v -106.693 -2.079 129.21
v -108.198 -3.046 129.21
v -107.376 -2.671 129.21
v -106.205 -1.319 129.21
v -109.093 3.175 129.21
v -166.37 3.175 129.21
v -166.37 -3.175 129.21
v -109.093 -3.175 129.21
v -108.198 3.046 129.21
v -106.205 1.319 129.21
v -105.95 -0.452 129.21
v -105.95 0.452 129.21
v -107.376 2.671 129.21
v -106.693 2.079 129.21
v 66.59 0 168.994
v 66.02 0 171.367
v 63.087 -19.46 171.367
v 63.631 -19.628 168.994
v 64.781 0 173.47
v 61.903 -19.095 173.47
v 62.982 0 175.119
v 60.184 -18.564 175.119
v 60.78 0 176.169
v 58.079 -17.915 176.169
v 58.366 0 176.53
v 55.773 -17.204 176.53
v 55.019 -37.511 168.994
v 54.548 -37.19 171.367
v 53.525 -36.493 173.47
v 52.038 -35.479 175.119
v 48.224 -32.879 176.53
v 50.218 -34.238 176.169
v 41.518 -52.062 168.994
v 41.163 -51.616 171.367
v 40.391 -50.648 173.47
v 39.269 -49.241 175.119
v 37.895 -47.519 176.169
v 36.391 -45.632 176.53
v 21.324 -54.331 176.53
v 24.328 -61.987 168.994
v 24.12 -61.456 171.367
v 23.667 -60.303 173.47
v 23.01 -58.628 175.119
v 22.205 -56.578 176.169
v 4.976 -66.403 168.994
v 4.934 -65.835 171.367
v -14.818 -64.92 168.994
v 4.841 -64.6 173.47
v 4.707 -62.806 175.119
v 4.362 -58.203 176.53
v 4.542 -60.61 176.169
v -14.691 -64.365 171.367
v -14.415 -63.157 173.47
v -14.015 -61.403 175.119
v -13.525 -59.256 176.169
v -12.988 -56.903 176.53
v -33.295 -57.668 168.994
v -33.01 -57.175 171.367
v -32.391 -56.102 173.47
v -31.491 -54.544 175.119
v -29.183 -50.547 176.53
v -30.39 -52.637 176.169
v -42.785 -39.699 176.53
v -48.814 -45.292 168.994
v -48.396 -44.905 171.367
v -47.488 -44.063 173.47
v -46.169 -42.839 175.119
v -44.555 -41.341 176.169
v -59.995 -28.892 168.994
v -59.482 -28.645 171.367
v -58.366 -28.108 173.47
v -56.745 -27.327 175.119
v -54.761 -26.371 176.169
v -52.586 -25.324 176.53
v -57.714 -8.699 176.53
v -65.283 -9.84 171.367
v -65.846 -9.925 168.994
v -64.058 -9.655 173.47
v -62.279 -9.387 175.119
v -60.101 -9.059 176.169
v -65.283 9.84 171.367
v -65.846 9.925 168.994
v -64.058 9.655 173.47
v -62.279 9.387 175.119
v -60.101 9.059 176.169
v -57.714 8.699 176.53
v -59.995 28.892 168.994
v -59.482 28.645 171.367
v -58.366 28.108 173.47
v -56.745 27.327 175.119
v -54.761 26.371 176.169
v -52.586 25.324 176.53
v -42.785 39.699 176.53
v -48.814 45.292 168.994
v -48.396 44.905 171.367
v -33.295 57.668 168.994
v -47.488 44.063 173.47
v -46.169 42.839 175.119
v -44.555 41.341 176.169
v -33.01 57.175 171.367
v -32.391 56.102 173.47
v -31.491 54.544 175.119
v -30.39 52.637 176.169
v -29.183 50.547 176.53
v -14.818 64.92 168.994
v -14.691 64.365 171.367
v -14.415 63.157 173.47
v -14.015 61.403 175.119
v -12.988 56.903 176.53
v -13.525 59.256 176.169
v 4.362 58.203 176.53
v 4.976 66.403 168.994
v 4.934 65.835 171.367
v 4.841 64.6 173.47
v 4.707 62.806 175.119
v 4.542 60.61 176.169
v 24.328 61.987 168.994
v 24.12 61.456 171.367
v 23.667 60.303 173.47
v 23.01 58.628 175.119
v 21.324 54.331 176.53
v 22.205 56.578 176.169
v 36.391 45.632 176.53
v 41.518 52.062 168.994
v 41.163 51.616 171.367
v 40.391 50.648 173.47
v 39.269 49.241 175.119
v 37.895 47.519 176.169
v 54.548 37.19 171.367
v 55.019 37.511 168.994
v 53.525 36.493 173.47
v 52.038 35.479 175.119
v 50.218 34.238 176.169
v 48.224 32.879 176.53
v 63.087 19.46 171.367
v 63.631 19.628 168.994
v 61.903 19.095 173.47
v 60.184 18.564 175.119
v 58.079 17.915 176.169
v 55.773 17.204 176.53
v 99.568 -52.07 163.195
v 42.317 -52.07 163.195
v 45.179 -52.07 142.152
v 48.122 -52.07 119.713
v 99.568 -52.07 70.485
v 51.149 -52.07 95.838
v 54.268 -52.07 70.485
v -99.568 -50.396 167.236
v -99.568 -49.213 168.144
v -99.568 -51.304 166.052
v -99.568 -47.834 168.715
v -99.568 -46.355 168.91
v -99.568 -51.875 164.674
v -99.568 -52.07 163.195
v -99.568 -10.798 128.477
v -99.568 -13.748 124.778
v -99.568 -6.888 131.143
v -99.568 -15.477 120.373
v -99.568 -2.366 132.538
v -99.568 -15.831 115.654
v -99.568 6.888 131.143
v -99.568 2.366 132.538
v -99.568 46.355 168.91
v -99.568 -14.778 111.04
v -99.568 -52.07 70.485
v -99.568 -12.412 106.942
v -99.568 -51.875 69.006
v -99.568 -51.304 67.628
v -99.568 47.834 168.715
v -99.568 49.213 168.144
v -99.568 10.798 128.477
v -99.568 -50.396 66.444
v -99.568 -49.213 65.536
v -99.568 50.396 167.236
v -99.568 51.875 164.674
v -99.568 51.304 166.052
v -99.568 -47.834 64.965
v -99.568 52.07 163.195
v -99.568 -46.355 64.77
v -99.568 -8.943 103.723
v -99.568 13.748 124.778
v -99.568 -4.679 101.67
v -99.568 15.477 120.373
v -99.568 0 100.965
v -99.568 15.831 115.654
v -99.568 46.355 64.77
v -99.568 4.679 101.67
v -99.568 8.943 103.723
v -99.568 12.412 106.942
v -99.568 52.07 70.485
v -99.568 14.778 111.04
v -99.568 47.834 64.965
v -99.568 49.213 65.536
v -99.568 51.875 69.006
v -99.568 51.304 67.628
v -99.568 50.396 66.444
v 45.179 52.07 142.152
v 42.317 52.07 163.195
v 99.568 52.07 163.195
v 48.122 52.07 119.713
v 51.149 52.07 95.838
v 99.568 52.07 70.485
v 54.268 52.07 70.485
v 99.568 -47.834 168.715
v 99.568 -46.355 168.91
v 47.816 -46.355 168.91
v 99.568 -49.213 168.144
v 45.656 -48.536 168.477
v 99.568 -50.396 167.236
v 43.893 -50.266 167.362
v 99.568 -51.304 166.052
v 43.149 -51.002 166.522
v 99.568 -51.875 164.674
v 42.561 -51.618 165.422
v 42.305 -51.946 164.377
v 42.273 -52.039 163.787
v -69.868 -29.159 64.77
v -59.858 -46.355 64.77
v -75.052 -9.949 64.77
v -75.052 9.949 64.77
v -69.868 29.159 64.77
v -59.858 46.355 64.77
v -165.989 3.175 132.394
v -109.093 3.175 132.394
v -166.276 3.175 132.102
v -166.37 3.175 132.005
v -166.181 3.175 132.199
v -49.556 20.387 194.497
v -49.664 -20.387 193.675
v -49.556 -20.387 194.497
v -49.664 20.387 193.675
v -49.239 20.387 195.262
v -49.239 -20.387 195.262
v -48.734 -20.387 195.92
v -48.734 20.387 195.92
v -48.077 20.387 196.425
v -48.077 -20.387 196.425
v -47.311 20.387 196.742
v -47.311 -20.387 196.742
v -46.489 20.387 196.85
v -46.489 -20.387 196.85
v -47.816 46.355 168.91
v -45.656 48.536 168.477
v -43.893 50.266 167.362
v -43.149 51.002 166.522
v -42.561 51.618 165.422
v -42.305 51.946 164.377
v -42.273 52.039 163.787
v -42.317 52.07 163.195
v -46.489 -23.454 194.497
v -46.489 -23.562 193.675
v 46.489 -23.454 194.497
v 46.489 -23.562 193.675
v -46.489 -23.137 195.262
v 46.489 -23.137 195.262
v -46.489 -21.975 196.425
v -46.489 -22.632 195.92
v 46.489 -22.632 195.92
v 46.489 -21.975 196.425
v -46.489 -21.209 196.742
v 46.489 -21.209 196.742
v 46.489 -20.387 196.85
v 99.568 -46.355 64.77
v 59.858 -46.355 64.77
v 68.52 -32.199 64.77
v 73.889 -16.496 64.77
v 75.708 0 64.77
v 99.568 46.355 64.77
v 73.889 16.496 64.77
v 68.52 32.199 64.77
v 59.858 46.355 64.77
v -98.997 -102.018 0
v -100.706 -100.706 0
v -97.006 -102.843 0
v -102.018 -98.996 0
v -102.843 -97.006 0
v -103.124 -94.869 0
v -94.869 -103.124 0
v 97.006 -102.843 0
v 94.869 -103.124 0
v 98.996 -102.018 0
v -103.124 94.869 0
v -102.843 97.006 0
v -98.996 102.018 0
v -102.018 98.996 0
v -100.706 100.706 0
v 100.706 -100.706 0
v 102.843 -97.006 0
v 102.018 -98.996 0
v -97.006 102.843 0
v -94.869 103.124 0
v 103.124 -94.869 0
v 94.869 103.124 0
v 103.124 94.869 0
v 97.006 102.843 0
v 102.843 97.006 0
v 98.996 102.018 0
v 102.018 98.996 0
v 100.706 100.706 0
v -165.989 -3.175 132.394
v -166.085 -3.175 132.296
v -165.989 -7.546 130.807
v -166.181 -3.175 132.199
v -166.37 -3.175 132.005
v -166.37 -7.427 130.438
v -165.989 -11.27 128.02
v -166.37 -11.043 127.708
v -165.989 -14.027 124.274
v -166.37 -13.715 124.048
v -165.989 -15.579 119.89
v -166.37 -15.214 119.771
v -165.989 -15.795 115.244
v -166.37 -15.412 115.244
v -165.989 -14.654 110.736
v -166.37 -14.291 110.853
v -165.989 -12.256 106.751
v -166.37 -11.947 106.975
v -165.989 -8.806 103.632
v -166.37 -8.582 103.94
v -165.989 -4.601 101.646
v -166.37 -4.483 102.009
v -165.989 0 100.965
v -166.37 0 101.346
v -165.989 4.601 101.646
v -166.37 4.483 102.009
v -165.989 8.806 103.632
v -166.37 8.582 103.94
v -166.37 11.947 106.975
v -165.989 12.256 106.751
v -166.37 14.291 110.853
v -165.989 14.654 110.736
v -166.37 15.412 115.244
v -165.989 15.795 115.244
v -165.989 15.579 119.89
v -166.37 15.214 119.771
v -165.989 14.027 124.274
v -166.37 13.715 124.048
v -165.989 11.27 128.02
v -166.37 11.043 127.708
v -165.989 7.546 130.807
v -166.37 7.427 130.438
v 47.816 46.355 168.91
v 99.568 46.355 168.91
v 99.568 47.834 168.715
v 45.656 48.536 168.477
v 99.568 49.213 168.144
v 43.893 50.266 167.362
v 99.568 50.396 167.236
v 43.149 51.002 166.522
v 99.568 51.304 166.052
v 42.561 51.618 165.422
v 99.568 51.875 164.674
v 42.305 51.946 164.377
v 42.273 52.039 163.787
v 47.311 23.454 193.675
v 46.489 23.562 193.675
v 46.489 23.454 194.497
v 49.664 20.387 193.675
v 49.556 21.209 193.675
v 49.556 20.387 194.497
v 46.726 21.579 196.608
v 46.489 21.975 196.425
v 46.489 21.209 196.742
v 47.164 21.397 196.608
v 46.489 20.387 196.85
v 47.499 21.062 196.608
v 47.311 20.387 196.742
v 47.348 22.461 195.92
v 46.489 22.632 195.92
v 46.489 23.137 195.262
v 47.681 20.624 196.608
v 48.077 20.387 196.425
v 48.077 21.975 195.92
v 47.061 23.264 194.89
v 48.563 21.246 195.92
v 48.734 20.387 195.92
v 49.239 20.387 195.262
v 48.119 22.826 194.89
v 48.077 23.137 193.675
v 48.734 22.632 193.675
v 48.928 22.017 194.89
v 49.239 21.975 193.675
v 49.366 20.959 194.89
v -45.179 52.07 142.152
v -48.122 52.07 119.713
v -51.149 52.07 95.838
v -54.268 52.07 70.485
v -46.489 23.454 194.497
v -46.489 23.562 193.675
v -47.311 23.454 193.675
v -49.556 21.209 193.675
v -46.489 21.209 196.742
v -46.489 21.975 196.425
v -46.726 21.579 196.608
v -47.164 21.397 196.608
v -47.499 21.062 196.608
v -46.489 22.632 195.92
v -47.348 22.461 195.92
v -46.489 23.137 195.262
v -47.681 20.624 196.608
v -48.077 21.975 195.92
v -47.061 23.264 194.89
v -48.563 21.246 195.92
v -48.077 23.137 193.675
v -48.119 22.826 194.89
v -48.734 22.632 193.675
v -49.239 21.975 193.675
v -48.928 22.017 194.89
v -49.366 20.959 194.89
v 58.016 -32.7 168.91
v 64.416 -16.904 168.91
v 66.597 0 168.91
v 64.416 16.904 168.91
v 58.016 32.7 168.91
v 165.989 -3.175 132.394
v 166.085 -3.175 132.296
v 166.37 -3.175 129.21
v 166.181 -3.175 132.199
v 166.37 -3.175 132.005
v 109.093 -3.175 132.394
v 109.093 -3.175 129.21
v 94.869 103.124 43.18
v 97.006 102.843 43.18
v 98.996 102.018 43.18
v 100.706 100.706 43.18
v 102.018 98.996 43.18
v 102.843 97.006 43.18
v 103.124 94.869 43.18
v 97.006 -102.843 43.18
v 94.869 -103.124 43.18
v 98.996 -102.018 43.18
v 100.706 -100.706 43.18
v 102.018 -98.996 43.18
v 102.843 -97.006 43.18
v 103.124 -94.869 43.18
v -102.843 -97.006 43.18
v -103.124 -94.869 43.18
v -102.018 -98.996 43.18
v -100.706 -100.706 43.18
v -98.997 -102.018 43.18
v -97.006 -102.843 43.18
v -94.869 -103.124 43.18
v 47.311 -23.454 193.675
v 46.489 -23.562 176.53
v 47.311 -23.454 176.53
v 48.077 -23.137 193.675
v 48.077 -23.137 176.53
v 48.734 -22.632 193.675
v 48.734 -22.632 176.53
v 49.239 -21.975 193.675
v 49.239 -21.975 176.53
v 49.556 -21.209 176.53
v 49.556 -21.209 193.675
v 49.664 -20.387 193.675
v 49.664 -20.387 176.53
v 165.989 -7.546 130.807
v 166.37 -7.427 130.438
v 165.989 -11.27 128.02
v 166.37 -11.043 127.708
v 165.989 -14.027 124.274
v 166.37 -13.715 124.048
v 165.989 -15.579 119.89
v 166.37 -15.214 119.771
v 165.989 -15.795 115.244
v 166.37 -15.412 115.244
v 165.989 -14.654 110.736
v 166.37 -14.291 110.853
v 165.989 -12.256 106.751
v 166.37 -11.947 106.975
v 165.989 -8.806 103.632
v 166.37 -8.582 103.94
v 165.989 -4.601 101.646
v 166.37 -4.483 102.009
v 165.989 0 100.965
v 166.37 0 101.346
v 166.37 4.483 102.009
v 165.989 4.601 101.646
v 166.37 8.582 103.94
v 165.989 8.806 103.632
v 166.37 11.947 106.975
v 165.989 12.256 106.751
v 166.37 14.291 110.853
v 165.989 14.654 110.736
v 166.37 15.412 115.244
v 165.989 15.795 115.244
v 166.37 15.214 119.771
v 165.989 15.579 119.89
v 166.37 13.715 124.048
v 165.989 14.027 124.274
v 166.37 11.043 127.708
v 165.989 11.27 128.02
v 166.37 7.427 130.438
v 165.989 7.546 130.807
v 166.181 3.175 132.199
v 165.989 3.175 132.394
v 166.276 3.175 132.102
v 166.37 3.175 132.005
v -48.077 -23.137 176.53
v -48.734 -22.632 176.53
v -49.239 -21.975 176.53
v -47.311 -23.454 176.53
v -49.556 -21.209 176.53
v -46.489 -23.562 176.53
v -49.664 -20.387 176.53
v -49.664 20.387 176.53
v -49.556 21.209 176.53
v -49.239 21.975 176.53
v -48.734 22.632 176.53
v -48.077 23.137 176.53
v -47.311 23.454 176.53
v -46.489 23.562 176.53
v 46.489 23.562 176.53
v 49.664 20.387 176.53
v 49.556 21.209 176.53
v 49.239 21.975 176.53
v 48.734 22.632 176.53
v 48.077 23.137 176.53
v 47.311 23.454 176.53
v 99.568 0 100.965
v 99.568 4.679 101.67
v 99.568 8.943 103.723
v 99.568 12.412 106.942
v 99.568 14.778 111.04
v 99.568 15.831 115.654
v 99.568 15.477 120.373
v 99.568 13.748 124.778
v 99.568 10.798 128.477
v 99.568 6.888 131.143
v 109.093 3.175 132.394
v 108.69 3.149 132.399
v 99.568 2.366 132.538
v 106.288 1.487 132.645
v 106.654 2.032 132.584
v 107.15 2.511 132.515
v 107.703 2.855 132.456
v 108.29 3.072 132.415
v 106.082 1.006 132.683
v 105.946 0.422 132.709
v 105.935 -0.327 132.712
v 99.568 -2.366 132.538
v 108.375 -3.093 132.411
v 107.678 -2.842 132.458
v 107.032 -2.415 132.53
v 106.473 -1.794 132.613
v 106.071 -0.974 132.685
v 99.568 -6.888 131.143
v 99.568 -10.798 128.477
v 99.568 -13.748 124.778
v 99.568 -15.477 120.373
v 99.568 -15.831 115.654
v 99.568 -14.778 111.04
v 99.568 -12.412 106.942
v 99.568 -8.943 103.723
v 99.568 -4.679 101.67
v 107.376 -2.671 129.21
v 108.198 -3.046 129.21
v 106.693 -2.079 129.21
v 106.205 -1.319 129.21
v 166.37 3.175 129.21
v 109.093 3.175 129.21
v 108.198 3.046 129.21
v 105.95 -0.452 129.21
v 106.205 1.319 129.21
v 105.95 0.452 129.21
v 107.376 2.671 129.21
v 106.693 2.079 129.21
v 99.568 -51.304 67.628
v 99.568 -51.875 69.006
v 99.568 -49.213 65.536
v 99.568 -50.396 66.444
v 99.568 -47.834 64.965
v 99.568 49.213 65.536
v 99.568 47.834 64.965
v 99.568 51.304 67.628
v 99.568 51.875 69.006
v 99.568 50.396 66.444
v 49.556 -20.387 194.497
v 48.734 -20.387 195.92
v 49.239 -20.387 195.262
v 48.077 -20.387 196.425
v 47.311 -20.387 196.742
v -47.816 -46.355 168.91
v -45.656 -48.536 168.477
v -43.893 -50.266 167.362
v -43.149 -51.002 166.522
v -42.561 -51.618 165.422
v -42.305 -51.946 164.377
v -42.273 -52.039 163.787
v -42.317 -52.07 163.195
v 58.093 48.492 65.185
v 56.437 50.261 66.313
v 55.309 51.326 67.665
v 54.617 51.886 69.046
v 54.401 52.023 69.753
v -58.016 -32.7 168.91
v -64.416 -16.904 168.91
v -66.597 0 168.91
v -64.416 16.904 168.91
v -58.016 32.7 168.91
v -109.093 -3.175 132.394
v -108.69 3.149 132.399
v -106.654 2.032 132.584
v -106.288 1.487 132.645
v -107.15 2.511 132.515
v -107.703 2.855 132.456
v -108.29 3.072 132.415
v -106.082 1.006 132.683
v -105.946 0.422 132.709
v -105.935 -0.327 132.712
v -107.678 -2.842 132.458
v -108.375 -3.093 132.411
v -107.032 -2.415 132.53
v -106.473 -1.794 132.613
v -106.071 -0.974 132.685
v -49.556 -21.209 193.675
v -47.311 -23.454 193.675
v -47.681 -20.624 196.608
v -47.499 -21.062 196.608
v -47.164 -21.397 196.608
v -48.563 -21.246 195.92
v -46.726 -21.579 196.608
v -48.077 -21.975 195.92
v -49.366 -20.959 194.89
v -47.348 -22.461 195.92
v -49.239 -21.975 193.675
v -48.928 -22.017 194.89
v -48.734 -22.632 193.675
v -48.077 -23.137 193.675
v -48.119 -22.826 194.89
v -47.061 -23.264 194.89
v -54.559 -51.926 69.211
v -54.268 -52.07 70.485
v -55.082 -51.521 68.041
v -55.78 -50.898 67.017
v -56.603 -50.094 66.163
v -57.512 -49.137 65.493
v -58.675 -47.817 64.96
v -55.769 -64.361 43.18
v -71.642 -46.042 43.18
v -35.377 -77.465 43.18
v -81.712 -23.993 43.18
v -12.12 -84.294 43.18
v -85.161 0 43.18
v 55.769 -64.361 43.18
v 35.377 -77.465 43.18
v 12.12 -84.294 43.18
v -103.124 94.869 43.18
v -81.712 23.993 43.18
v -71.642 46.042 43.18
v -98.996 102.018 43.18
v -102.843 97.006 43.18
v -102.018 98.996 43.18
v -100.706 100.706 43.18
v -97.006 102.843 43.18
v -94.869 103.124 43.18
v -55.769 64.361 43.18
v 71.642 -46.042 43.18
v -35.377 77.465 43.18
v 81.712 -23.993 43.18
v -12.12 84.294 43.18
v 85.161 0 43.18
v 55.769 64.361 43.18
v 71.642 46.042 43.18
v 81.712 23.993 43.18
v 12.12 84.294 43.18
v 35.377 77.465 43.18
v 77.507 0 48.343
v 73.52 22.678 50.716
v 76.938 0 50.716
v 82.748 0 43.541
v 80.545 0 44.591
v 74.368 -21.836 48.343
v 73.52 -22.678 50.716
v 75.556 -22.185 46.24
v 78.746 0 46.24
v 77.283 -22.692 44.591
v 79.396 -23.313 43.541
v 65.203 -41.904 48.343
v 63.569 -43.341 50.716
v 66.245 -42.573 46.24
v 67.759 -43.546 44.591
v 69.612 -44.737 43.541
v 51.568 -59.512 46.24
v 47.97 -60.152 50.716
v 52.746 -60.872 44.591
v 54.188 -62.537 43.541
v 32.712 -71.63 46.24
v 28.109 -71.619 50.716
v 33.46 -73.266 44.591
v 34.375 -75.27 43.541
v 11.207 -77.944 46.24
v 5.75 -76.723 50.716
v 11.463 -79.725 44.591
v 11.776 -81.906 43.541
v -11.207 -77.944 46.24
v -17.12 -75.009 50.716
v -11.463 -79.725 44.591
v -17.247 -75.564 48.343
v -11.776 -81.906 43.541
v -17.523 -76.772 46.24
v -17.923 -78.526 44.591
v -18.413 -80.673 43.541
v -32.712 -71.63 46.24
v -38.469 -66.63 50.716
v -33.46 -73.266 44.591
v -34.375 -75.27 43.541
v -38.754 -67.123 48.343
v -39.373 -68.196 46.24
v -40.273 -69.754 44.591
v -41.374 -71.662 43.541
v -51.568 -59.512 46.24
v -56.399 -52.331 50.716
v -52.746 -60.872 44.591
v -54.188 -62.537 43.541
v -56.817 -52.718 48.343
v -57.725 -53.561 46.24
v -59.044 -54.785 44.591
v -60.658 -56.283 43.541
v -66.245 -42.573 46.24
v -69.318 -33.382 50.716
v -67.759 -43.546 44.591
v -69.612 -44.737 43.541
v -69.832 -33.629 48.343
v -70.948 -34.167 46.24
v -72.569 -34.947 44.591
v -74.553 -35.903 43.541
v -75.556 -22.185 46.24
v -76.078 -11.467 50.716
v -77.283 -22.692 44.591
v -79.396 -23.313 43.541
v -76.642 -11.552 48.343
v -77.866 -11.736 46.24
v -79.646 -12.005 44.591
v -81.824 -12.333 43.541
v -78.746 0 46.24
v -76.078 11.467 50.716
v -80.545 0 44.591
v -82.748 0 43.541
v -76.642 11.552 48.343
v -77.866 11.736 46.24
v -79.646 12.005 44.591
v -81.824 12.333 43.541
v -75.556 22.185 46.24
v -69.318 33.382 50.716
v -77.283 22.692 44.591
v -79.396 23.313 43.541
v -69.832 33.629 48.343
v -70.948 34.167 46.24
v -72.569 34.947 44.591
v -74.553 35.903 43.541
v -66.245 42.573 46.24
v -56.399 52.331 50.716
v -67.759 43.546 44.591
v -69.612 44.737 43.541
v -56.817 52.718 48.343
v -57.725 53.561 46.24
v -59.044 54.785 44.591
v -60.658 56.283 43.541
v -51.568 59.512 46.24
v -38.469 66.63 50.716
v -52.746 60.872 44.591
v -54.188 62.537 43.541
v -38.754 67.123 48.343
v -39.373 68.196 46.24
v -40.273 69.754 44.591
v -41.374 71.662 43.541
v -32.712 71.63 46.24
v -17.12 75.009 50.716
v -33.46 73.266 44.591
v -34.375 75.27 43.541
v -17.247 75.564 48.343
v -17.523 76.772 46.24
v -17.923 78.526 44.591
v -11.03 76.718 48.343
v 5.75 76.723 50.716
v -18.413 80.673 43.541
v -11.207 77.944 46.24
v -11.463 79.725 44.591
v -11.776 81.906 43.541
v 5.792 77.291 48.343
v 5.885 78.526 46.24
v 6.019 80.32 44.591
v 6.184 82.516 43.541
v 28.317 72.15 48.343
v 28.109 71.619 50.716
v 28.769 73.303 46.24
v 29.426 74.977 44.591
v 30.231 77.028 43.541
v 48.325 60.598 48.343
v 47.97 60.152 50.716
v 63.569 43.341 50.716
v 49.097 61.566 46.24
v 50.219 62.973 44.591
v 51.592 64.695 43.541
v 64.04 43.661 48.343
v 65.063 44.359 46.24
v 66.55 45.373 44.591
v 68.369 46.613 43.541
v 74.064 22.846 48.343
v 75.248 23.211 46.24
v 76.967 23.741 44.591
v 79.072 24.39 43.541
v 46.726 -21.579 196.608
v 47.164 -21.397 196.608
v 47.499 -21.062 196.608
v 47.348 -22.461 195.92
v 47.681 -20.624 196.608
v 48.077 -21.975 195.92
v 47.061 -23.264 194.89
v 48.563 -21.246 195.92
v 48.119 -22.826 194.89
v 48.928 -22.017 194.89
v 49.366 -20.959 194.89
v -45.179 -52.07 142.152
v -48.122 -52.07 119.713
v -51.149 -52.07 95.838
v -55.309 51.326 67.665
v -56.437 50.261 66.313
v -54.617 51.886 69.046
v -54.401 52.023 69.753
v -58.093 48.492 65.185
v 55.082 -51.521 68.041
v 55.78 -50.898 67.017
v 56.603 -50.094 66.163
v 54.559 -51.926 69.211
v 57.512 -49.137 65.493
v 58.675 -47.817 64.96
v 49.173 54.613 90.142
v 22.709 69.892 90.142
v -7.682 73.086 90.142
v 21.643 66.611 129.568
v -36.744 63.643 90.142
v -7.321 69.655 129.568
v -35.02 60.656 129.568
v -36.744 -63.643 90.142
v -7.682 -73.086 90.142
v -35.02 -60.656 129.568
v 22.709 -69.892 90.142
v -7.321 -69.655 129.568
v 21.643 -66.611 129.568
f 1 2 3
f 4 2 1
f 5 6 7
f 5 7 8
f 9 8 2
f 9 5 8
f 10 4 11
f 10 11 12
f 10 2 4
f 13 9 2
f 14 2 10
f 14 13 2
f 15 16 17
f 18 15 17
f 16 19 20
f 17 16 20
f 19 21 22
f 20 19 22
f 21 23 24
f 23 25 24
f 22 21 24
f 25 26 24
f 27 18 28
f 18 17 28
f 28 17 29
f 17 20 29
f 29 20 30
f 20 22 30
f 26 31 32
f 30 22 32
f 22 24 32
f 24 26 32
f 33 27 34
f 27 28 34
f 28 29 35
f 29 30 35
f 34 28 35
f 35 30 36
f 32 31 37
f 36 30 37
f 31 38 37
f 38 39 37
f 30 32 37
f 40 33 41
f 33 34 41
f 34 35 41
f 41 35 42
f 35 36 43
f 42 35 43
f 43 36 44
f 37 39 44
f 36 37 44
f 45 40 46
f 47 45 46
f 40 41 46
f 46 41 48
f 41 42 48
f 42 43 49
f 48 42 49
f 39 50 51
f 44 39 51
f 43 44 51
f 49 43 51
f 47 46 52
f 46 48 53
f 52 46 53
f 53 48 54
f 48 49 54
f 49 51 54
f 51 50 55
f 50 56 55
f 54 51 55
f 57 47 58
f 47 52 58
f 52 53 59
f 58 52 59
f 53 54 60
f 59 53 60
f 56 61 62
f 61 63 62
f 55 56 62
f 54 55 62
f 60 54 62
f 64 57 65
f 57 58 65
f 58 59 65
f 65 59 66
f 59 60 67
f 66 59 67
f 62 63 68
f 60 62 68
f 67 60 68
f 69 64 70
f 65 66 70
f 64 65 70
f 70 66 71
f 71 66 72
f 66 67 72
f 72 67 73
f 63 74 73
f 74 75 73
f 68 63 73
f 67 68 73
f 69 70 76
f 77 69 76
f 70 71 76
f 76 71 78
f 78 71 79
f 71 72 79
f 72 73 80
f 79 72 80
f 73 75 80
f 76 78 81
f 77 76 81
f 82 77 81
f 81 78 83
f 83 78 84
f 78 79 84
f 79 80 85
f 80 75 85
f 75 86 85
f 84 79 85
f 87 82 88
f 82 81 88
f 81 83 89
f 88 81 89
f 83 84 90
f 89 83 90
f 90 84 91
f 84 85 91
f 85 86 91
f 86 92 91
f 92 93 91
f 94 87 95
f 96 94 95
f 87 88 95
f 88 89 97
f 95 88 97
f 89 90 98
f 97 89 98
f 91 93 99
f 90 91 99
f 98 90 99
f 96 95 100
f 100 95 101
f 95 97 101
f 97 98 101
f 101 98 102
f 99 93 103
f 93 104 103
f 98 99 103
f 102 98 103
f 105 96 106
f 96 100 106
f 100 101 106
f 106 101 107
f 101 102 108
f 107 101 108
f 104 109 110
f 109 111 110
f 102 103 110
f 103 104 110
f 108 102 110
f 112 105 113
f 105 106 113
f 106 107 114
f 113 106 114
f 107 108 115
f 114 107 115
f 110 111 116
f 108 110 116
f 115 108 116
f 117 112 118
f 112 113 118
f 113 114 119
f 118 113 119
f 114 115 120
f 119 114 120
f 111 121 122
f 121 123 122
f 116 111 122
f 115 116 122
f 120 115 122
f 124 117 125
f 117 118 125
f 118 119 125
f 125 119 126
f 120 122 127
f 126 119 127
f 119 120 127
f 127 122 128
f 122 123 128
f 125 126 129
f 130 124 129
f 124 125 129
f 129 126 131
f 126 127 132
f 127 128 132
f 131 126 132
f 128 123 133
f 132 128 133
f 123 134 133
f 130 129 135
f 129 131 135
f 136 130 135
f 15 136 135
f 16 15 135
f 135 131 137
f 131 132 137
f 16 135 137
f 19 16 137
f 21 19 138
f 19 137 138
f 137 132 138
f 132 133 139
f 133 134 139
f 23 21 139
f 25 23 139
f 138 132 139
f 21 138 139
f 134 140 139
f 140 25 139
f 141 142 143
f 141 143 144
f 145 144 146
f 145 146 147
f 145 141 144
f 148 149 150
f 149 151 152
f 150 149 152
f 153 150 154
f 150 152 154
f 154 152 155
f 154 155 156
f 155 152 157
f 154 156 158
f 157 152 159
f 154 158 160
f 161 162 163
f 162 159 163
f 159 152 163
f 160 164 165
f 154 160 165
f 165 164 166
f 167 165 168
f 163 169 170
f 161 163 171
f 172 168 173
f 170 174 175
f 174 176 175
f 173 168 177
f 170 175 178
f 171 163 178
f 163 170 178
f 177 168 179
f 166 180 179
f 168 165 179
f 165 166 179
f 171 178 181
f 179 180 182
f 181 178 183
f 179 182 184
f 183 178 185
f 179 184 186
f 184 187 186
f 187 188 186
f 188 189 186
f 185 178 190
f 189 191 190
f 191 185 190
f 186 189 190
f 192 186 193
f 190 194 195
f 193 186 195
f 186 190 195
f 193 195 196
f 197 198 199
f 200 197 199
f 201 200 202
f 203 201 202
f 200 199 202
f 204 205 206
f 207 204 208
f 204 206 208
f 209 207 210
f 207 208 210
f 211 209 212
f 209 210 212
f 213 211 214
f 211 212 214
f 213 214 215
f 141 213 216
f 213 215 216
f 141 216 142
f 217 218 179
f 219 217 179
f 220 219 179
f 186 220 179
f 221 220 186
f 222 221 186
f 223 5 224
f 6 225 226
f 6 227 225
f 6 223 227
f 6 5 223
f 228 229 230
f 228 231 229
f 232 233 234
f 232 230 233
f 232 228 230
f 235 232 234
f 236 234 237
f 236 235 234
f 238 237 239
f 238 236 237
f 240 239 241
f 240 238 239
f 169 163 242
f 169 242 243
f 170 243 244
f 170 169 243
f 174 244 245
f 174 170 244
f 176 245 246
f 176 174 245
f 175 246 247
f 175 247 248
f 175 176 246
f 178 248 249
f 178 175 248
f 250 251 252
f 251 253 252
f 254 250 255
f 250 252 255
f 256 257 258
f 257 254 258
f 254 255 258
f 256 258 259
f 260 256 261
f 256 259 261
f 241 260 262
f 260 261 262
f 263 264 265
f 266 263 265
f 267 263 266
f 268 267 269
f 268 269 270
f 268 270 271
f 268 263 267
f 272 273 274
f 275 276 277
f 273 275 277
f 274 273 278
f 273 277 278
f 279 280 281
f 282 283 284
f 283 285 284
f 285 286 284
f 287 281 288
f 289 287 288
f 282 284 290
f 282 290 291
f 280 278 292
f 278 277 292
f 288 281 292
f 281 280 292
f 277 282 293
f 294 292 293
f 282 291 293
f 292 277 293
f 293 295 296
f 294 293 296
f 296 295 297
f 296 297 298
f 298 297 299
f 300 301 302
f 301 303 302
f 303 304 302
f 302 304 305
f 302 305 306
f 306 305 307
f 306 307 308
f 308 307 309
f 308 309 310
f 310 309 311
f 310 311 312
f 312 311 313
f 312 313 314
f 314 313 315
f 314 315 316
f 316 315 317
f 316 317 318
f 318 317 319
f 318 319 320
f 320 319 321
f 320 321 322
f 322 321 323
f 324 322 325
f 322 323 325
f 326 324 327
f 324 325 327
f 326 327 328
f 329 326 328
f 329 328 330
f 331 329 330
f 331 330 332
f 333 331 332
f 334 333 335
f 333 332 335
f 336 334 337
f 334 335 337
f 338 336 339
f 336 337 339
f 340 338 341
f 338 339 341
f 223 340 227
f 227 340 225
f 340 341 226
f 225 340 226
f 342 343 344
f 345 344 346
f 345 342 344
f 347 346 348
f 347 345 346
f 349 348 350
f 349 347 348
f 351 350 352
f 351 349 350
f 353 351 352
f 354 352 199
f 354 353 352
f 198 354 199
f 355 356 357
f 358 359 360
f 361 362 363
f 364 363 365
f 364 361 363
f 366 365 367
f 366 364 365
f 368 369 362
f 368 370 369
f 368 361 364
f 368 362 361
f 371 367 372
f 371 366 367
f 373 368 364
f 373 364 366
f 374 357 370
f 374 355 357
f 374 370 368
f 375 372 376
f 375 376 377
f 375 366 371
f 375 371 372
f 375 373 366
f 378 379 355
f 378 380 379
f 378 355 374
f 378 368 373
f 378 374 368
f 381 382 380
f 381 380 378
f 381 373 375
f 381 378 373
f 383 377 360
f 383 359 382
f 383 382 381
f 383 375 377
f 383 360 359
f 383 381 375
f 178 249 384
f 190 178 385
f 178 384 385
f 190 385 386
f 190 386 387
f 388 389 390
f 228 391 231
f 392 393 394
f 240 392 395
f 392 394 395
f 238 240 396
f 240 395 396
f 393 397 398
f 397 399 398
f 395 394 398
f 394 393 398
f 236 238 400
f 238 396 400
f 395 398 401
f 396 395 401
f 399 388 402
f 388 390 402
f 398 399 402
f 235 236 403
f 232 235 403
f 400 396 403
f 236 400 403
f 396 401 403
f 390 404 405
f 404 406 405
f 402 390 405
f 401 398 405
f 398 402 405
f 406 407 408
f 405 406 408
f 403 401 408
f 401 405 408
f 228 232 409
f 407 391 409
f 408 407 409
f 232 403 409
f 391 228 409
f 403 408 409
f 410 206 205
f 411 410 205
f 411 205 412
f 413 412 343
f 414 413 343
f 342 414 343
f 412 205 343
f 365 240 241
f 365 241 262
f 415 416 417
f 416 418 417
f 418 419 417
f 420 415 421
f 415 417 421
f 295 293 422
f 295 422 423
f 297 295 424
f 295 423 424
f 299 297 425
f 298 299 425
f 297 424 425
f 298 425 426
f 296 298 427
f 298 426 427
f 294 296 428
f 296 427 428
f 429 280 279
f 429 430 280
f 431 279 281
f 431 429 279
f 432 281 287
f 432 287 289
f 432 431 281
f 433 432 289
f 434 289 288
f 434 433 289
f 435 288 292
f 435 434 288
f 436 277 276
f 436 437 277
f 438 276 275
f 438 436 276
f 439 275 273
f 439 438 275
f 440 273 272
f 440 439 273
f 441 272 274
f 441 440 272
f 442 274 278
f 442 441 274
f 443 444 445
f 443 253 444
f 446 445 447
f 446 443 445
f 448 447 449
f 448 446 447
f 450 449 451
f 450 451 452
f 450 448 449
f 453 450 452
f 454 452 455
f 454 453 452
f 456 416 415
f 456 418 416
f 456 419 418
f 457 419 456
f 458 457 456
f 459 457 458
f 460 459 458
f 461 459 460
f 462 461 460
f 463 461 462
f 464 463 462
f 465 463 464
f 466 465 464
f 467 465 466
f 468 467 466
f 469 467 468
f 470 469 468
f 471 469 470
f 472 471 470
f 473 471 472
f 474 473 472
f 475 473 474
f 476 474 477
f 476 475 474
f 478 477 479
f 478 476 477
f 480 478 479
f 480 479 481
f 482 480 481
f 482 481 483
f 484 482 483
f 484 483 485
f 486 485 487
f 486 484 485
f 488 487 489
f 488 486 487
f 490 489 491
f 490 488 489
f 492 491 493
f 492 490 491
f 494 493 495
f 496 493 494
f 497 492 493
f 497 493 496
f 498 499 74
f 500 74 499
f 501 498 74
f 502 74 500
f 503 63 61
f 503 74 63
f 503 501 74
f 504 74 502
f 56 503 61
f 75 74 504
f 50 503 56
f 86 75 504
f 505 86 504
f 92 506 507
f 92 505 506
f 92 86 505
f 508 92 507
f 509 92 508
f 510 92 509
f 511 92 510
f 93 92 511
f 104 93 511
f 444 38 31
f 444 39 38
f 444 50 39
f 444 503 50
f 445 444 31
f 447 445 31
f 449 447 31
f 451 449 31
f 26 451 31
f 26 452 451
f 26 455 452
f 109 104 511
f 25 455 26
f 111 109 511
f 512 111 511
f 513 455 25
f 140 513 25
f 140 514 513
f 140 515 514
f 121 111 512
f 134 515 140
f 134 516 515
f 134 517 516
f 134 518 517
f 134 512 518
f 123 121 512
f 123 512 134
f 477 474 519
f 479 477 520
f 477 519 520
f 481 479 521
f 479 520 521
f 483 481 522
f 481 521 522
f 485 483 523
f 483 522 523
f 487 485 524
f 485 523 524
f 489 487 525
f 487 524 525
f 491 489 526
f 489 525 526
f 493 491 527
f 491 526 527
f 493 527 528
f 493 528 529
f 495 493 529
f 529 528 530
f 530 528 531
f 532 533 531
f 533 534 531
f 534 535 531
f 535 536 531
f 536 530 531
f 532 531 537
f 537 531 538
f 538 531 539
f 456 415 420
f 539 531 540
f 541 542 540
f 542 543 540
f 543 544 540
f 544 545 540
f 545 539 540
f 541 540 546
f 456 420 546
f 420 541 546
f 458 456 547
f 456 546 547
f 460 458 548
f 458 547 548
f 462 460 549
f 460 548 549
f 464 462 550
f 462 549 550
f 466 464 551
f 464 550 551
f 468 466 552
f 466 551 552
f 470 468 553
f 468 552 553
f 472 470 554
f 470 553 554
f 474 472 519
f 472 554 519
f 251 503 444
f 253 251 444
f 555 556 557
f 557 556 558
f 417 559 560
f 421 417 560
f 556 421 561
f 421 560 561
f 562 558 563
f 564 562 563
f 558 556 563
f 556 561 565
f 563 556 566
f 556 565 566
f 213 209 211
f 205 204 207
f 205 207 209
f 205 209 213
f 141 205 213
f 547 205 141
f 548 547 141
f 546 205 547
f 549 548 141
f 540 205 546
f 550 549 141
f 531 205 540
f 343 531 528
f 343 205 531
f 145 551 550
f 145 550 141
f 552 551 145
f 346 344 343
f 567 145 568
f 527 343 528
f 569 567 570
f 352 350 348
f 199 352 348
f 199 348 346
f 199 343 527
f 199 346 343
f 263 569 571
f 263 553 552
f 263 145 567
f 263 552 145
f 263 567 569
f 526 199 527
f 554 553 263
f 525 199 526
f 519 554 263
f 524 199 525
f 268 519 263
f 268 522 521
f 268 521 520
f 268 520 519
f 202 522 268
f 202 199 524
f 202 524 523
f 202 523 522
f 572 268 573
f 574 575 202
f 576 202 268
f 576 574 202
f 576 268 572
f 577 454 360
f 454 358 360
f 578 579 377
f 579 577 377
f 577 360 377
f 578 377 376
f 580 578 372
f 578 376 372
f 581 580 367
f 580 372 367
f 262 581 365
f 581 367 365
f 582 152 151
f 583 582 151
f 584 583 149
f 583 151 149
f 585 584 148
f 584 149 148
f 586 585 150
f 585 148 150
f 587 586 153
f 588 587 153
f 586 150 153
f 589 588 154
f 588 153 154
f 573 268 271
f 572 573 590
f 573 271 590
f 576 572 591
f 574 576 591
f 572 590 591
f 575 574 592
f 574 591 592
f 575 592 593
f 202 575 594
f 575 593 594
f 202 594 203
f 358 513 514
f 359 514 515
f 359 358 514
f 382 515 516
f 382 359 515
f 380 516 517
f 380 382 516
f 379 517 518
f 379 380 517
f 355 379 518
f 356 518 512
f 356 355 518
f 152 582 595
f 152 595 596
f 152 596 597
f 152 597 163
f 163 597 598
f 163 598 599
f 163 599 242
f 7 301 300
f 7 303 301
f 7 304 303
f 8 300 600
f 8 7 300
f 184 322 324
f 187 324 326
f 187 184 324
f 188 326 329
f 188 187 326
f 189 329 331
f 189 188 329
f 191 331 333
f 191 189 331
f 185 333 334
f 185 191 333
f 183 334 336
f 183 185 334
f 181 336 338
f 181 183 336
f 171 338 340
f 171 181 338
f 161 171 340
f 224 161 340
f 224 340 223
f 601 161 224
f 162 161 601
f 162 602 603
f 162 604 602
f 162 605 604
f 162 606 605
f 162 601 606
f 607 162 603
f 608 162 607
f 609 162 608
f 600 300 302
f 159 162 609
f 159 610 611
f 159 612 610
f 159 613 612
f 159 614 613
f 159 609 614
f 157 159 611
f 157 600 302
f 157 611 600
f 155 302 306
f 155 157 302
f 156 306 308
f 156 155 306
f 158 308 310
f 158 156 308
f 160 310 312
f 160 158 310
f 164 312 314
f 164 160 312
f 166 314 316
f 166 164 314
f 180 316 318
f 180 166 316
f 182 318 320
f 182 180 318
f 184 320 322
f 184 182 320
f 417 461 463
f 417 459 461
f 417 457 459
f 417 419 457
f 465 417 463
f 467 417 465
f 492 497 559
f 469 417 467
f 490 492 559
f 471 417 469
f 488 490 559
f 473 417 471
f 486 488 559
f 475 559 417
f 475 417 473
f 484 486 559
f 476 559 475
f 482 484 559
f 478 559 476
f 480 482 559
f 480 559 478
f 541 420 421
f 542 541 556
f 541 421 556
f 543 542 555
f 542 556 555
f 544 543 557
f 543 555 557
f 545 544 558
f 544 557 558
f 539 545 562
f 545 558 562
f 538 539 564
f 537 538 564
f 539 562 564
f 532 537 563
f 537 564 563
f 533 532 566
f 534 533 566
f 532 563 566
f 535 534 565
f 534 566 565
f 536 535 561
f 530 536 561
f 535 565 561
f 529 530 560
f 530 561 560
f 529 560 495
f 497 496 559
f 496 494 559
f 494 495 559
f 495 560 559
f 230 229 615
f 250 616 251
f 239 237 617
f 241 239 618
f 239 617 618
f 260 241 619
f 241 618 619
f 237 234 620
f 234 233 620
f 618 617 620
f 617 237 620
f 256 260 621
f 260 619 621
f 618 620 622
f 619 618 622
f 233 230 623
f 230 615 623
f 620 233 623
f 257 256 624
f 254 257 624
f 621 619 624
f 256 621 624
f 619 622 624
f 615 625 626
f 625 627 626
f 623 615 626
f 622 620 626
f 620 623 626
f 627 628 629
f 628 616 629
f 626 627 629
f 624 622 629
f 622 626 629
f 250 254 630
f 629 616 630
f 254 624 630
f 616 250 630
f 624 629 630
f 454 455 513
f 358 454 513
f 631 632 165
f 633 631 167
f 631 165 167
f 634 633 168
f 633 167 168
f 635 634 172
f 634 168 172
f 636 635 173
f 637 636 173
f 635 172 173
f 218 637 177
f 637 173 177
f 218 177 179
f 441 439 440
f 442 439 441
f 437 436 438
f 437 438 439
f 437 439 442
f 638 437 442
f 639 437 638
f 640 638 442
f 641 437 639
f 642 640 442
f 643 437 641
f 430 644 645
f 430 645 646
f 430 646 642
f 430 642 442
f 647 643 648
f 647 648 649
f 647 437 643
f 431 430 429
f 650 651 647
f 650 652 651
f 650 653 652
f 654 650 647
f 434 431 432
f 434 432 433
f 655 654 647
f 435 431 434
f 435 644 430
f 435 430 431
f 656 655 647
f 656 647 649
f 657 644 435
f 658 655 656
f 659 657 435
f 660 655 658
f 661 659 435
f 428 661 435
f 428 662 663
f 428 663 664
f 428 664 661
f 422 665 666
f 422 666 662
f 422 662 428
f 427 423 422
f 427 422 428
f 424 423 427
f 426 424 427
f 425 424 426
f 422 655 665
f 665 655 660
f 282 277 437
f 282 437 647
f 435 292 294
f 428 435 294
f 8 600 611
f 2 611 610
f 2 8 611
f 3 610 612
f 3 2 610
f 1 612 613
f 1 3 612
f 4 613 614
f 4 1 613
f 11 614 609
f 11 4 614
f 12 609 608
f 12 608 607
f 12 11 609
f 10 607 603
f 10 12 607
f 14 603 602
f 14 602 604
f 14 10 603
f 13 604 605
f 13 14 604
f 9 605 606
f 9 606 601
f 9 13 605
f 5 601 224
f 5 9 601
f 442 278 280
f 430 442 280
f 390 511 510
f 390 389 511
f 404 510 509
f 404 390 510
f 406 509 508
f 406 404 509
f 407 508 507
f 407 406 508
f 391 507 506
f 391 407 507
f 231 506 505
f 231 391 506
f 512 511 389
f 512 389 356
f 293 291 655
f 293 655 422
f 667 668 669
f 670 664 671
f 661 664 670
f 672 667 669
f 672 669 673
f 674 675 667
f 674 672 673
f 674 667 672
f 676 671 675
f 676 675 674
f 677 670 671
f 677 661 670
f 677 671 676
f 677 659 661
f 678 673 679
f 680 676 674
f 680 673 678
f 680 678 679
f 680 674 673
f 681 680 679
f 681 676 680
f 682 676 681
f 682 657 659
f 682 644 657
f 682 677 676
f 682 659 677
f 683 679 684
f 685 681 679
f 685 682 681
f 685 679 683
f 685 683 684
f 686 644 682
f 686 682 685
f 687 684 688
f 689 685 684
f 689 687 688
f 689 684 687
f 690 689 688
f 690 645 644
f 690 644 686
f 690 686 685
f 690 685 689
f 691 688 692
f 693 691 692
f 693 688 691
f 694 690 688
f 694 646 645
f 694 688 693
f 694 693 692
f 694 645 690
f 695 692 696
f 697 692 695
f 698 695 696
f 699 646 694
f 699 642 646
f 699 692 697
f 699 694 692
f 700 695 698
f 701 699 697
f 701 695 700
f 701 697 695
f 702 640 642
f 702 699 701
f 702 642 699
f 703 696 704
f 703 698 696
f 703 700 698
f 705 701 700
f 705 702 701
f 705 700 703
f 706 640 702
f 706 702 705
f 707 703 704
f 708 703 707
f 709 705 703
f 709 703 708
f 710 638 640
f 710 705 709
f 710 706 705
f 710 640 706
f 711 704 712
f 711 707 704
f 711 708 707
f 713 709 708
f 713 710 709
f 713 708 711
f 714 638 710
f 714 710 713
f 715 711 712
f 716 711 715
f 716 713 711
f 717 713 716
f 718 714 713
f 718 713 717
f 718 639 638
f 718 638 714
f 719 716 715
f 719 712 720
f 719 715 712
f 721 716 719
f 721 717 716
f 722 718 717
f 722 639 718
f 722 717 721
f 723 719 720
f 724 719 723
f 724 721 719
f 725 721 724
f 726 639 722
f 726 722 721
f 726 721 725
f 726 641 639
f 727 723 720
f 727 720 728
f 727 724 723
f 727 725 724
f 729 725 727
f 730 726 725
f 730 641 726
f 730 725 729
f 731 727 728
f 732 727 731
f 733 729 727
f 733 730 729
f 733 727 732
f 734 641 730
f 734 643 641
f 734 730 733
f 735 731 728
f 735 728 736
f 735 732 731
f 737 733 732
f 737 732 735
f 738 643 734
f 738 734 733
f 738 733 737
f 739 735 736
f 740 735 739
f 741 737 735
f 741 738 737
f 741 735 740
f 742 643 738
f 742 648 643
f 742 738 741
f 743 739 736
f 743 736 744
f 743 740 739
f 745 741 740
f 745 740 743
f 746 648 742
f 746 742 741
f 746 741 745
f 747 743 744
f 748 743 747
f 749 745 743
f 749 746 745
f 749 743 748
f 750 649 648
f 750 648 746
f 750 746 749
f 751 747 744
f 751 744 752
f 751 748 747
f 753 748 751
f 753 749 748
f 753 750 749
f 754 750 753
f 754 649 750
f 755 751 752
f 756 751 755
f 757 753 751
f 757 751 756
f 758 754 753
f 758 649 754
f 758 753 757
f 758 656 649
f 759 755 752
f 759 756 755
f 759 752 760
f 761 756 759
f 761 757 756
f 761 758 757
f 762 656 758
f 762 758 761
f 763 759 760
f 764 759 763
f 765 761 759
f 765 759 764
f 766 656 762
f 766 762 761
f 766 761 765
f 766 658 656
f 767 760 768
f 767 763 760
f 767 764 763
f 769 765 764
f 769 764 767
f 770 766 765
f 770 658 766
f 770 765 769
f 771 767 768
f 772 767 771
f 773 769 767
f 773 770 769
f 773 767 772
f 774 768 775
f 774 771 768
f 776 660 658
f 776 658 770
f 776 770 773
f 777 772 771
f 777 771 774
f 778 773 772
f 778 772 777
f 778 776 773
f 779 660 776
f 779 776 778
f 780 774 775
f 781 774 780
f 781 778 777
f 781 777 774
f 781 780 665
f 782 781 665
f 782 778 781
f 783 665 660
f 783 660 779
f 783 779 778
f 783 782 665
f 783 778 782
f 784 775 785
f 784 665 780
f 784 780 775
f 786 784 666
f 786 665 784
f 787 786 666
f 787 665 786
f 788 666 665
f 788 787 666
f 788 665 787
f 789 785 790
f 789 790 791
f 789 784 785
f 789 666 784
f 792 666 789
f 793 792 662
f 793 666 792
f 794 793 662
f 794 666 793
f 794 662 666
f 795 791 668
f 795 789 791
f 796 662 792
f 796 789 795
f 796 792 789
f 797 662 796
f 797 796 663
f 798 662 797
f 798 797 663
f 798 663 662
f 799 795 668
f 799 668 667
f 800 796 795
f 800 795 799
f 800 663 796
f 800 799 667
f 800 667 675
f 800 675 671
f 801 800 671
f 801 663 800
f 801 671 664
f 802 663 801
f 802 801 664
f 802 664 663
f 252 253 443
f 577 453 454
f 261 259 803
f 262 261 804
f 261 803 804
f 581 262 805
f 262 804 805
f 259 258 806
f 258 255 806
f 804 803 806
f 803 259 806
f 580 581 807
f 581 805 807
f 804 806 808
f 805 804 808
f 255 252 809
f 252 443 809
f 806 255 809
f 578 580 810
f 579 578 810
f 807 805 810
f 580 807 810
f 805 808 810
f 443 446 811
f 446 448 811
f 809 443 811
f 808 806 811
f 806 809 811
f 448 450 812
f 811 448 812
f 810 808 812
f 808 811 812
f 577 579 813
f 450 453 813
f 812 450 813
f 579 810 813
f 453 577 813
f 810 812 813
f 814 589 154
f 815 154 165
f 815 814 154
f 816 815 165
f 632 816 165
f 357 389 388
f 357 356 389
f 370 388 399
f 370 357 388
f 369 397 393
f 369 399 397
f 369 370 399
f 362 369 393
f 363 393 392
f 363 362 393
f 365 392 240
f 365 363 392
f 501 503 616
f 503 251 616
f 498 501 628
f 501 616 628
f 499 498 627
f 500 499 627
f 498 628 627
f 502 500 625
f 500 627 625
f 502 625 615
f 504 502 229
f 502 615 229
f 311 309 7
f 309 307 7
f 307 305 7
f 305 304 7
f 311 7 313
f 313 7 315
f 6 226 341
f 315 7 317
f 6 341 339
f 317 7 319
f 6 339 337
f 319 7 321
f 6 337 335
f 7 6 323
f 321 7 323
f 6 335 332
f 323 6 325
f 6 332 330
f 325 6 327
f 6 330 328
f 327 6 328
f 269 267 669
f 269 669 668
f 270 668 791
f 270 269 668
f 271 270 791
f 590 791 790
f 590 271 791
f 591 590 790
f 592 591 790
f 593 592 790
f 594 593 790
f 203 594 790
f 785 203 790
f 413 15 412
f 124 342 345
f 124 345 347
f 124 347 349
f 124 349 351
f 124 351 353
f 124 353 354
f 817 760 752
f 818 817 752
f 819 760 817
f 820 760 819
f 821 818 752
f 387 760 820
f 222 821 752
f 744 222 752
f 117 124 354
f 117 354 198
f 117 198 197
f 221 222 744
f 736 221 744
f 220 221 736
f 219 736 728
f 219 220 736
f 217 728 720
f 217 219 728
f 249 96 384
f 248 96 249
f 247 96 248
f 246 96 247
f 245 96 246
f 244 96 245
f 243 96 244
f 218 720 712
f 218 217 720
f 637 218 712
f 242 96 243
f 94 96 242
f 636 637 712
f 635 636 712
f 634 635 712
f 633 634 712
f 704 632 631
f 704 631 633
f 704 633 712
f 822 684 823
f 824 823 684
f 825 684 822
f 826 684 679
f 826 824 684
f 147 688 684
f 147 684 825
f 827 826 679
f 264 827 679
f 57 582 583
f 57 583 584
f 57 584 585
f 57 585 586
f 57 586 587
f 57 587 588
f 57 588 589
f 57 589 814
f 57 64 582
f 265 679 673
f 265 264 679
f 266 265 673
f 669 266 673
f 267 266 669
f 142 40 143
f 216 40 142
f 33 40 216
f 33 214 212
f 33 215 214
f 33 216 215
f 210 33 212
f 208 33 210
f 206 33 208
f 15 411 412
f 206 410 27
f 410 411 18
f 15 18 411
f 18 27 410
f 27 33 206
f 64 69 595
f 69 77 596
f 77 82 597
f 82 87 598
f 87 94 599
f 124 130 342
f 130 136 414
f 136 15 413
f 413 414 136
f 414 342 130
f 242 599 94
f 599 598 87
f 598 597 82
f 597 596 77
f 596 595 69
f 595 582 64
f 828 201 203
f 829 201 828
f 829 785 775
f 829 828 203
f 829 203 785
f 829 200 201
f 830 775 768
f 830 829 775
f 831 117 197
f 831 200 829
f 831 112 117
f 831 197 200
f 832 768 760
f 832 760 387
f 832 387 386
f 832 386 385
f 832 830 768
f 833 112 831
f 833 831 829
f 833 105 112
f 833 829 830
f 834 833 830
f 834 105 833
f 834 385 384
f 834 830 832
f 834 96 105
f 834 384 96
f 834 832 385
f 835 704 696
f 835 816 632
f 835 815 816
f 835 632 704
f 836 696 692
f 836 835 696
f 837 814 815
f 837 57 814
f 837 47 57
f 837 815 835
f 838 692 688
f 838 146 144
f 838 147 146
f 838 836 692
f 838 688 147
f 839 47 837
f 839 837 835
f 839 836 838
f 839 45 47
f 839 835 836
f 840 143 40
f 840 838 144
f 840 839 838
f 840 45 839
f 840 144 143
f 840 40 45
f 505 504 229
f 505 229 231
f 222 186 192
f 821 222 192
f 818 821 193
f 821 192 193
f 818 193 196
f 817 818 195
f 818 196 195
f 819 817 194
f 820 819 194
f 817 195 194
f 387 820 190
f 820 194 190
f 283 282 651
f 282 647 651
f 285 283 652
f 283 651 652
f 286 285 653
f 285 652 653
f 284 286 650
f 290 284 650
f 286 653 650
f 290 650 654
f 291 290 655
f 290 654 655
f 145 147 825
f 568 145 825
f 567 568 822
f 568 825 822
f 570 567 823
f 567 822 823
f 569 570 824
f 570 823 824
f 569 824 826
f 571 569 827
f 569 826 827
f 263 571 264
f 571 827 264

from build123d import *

# Parameters (mm, degrees)
SKETCH1_W           = 206.248
SKETCH1_H           = 206.248
C_DIM_DEPTH         = 43.18
SHAFT_START         = 12.7
SKETCH_A_R          = 15.875
SHAFT_DEPTH         = 153.67
SKETCH3_W           = 104.14
SKETCH3_H           = 104.14
BOSS_EXTRUDE3_DEPTH = 99.568
FILLET1_R           = 5.715
FILLET4_R           = 5.715
SKETCH4_R           = 77.597
BOSS_EXTRUDE4_DEPTH = 133.35
BOSS_EXTRUDE4_TAPER = 5
FILLET2_R           = 8.255
SKETCH5_W           = 99.328405226
SKETCH5_H           = 47.124202614
BOSS_EXTRUDE5_DEPTH = 20.32
CHAMFER1_SIZE       = 0.381
FILLET3_R           = 3.175
CUT_EXTRUDE_START   = 12.3698
CUT_EXTRUDE_B_DEPTH = 68.6402


with BuildPart() as part:
    # Sketch1 → C dim (new body)
    with BuildSketch(Plane.XY):
        Rectangle(SKETCH1_W, SKETCH1_H)
    extrude(amount=C_DIM_DEPTH)



with BuildPart() as body_2:
    # Sketch A → Shaft (new body)
    with BuildSketch(Plane(origin=(0, 0, 0), x_dir=(0, 0, -1), z_dir=(1, 0, 0)).offset(SHAFT_START)):
        with Locations((-116.84, 0)):
            Circle(SKETCH_A_R)
    extrude(amount=SHAFT_DEPTH)

    # Chamfer1
    chamfer1_edges = [body_2.edges().sort_by_distance(p)[0] for p in [
        (166.37, 0, 132.715),
    ]]
    chamfer(chamfer1_edges, length=CHAMFER1_SIZE)

    # Sketch6 → Cut-Extrude B (cut, through all)
    with BuildSketch(Plane.XY.offset(116.84).offset(CUT_EXTRUDE_START)):
        with BuildLine():
            Line((166.37, -3.175), (109.093, -3.175))
            ThreePointArc((109.093, -3.175), (105.918, 0), (109.093, 3.175))
            Line((109.093, 3.175), (166.37, 3.175))
            ThreePointArc((166.37, 3.175), (169.545, 0), (166.37, -3.175))
        make_face()
    extrude(amount=CUT_EXTRUDE_B_DEPTH, mode=Mode.SUBTRACT)


with BuildPart() as body_3:
    # Sketch3 → Boss-Extrude3 (new body)
    with BuildSketch(Plane(origin=(0, 0, 0), x_dir=(0, 0, -1), z_dir=(1, 0, 0))):
        with Locations((-116.84, 0)):
            Rectangle(SKETCH3_W, SKETCH3_H)
    extrude(amount=BOSS_EXTRUDE3_DEPTH)


with BuildPart() as body_4:
    # Mirror2: mirrored copy
    add(body_3.part.mirror(Plane(origin=(0, 0, 0), x_dir=(0, 0, 1), z_dir=(1, 0, 0))))

    # Fillet4
    fillet4_edges = [body_4.edges().sort_by_distance(p)[0] for p in [
        (-49.784, 52.07, 64.77),
        (-49.784, 52.07, 168.91),
        (-49.784, -52.07, 168.91),
        (-49.784, -52.07, 64.77),
    ]]
    fillet(fillet4_edges, radius=FILLET4_R)


with BuildPart() as body_3_1:
    add(body_3.part)

    # Fillet1
    fillet1_edges = [body_3_1.edges().sort_by_distance(p)[0] for p in [
        (49.784, 52.07, 64.77),
        (49.784, 52.07, 168.91),
        (49.784, -52.07, 168.91),
        (49.784, -52.07, 64.77),
    ]]
    fillet(fillet1_edges, radius=FILLET1_R)


with BuildPart() as part_1:
    add(part.part)

    add(body_3_1.part)  # Boss-Extrude4 merges body 3

    add(body_4.part)  # Boss-Extrude4 merges body 4
    # Sketch4 → Boss-Extrude4 (add)
    with BuildSketch(Plane.XY.offset(43.18)):
        Circle(SKETCH4_R)
    extrude(amount=BOSS_EXTRUDE4_DEPTH, taper=BOSS_EXTRUDE4_TAPER)

    # Fillet2
    fillet2_edges = [part_1.edges().sort_by_distance(p)[0] for p in [
        (-65.930386719, 0, 176.53),
        (-77.597, 0, 43.18),
        (-103.124, 103.124, 21.59),
        (103.124, 103.124, 21.59),
        (103.124, -103.124, 21.59),
        (-103.124, -103.124, 21.59),
    ]]
    fillet(fillet2_edges, radius=FILLET2_R)

    # Sketch5 → Boss-Extrude5 (add)
    with BuildSketch(Plane.XY.offset(176.53)):
        Rectangle(SKETCH5_W, SKETCH5_H)
    extrude(amount=BOSS_EXTRUDE5_DEPTH)

    # Fillet3
    fillet3_edges = [part_1.edges().sort_by_distance(p)[0] for p in [
        (-49.664202613, 23.562101307, 186.69),
        (-49.664202613, -23.562101307, 186.69),
        (49.664202613, -23.562101307, 186.69),
        (49.664202613, 23.562101307, 186.69),
        (0, 23.562101307, 196.85),
        (-49.664202613, 0, 196.85),
        (0, -23.562101307, 196.85),
        (49.664202613, 0, 196.85),
    ]]
    fillet(fillet3_edges, radius=FILLET3_R)


with BuildPart() as body_3_2:
    # Mirror6: mirrored copy
    add(body_2.part.mirror(Plane(origin=(0, 0, 0), x_dir=(0, 0, 1), z_dir=(1, 0, 0))))


with BuildPart() as part_2:
    add(part_1.part)

    # Combine1: union body 2, body 3 2
    add(body_2.part)
    add(body_3_2.part)


solid = part_2.part
